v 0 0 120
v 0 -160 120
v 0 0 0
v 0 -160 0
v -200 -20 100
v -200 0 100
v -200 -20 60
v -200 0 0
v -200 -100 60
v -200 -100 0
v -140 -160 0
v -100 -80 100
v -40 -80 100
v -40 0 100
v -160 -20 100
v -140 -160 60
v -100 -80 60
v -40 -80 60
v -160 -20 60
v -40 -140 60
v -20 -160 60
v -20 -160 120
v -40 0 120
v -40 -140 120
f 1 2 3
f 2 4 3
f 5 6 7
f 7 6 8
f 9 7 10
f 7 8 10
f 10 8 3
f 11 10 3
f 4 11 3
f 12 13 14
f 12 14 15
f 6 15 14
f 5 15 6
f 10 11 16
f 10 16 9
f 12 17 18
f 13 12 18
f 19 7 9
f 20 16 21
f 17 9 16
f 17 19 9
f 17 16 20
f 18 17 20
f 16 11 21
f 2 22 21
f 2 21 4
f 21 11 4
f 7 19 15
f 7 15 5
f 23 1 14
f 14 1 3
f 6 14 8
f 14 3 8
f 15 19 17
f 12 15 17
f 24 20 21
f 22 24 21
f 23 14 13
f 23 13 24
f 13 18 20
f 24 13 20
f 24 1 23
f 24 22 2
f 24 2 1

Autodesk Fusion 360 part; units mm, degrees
sketch "Sketch1" plane through (0, 0, 0) normal (0, 0, 1) x (1, 0, 0)
  line L0 (0, 0) -> (-140, 0)
  line L1 (-140, 0) -> (-140, -160)
  line L2 (-140, -160) -> (0, -160)
  line L3 (0, -160) -> (0, 0)
  dimension "d1" = 140
  dimension "d2" = 160
extrude "Extrude1" add sketch "Sketch1" along normal blind 60
sketch "Sketch2" plane through (0, 0, 0) normal (0, 0, 1) x (1, 0, 0)
  line L0 (-140, 0) -> (-200, 0)
  line L1 (-200, 0) -> (-200, -100)
  line L2 (-200, -100) -> (-140, -100)
  line L3 (-140, -100) -> (-140, 0)
  dimension "d5" = 60
  dimension "d6" = 100
extrude "Extrude2" add sketch "Sketch2" along normal blind 60
sketch "Sketch3" plane through (0, 0, 0) normal (0, 0, 1) x (1, 0, 0)
sketch "Sketch4" plane through (0, 0, 0) normal (0, 0, 1) x (1, 0, 0)
  line L0 (-140, -160) -> (-200, -100)
  line L1 (-200, -100) -> (-140, -100)
  line L2 (-140, -100) -> (-140, -160)
extrude "Extrude3" add sketch "Sketch4" along normal blind 60
sketch "Sketch5" plane through (0, 0, 60) normal (0, 0, 1) x (-1, 0, 0)
  line L0 (0, 160) -> (0, 0)
  line L1 (0, 0) -> (200, 0)
  line L2 (200, 0) -> (200, 100)
  line L3 (200, 100) -> (140, 160)
  line L4 (140, 160) -> (0, 160)
  line L5 (0, 0) -> (20, 0)
  line L6 (20, 0) -> (20, 160)
  line L7 (20, 160) -> (0, 160)
  line L8 (0, 160) -> (0, 0)
  dimension "d11" = 20
extrude "Extrude4" add sketch "Sketch5" along normal blind 60 contours L0 L1 L4 L5 L6 L7 L8
sketch "Sketch6" plane through (0, 0, 60) normal (0, 0, 1) x (-1, 0, 0)
  line L0 (20, 160) -> (20, 0)
  line L1 (20, 0) -> (200, 0)
  line L2 (200, 0) -> (200, 100)
  line L3 (200, 100) -> (140, 160)
  line L4 (140, 160) -> (20, 160)
  line L5 (20, 0) -> (40, 0)
  line L6 (40, 0) -> (40, 140)
  line L7 (40, 140) -> (20, 140)
  line L8 (20, 140) -> (20, 0)
  dimension "d14" = 20
  dimension "d15" = 140
extrude "Extrude5" add sketch "Sketch6" along normal blind 60 contours L0 L1 L5 L6 L7 L8
sketch "Sketch7" plane through (0, 0, 60) normal (0, 0, 1) x (-1, 0, 0)
  line L0 (20, 140) -> (40, 140)
  line L1 (40, 140) -> (40, 0)
  line L2 (40, 0) -> (200, 0)
  line L3 (200, 0) -> (200, 100)
  line L4 (200, 100) -> (140, 160)
  line L5 (140, 160) -> (20, 160)
  line L6 (20, 160) -> (20, 140)
  line L7 (40, 140) -> (20, 160)
  line L8 (20, 140) -> (40, 140)
extrude "Extrude6" add sketch "Sketch7" along normal blind 60 contours L0 L6 L7 L8
sketch "Sketch8" plane through (0, 0, 60) normal (0, 0, 1) x (-1, 0, 0)
  line L0 (20, 160) -> (40, 140)
  line L1 (40, 140) -> (40, 0)
  line L2 (40, 0) -> (200, 0)
  line L3 (200, 0) -> (200, 100)
  line L4 (200, 100) -> (140, 160)
  line L5 (140, 160) -> (20, 160)
  line L6 (40, 0) -> (100, 0)
  line L7 (100, 0) -> (100, 80)
  line L8 (100, 80) -> (40, 80)
  line L9 (40, 80) -> (40, 0)
  dimension "d20" = 60
  dimension "d21" = 80
extrude "Extrude7" add sketch "Sketch8" along normal blind 40 contours L1 L2 L6 L7 L8 L9
sketch "Sketch9" plane through (0, 0, 60) normal (0, 0, 1) x (-1, 0, 0)
  line L0 (100, 80) -> (100, 0)
  line L1 (100, 0) -> (200, 0)
  line L2 (200, 0) -> (200, 100)
  line L3 (200, 100) -> (140, 160)
  line L4 (140, 160) -> (20, 160)
  line L5 (20, 160) -> (40, 140)
  line L6 (40, 140) -> (40, 80)
  line L7 (40, 80) -> (100, 80)
  line L8 (200, 0) -> (160, 0)
  line L9 (160, 0) -> (160, 20)
  line L10 (160, 20) -> (200, 20)
  line L11 (200, 20) -> (200, 0)
  dimension "d24" = 40
  dimension "d25" = 20
extrude "Extrude8" add sketch "Sketch9" along normal blind 40 contours L1 L2 L8 L9 L10 L11
sketch "Sketch10" plane through (0, 0, 60) normal (0, 0, 1) x (-1, 0, 0)
  line L0 (160, 0) -> (160, 20)
  line L1 (160, 20) -> (200, 20)
  line L2 (200, 20) -> (200, 100)
  line L3 (200, 100) -> (140, 160)
  line L4 (140, 160) -> (20, 160)
  line L5 (20, 160) -> (40, 140)
  line L6 (40, 140) -> (40, 80)
  line L7 (40, 80) -> (100, 80)
  line L8 (100, 80) -> (100, 0)
  line L9 (100, 0) -> (160, 0)
  line L10 (160, 20) -> (160, 0)
  line L11 (100, 0) -> (100, 80)
  line L12 (160, 20) -> (100, 80)
extrude "Extrude9" add sketch "Sketch10" along normal blind 40 contours L0 L8 L9 L10 L11 L12
sketch "Sketch11" plane through (-40, 0, 0) normal (-1, 0, 0) x (0, -1, 0)
  line L0 (0, 100) -> (80, 100)
  line L1 (80, 100) -> (80, 60)
  line L2 (80, 60) -> (140, 60)
  line L3 (140, 60) -> (140, 120)
  line L4 (140, 120) -> (0, 120)
  line L5 (0, 120) -> (0, 100)
sketch "Sketch12" plane through (-40, -70, 90) normal (-1, 0, 0) x (0, -1, 0)
  circle A0 centre (40, 0) radius 10
  dimension "d31" = 20
sketch "Sketch13" plane through (0, 0, 100) normal (0, 0, 1) x (-1, 0, 0)
  line L0 (40, 80) -> (40, 0)
  line L1 (40, 0) -> (200, 0)
  line L2 (200, 0) -> (200, 20)
  line L3 (200, 20) -> (160, 20)
  line L4 (160, 20) -> (100, 80)
  line L5 (100, 80) -> (40, 80)
  circle A0 centre (70, 40) radius 10
  dimension "d34" = 20
